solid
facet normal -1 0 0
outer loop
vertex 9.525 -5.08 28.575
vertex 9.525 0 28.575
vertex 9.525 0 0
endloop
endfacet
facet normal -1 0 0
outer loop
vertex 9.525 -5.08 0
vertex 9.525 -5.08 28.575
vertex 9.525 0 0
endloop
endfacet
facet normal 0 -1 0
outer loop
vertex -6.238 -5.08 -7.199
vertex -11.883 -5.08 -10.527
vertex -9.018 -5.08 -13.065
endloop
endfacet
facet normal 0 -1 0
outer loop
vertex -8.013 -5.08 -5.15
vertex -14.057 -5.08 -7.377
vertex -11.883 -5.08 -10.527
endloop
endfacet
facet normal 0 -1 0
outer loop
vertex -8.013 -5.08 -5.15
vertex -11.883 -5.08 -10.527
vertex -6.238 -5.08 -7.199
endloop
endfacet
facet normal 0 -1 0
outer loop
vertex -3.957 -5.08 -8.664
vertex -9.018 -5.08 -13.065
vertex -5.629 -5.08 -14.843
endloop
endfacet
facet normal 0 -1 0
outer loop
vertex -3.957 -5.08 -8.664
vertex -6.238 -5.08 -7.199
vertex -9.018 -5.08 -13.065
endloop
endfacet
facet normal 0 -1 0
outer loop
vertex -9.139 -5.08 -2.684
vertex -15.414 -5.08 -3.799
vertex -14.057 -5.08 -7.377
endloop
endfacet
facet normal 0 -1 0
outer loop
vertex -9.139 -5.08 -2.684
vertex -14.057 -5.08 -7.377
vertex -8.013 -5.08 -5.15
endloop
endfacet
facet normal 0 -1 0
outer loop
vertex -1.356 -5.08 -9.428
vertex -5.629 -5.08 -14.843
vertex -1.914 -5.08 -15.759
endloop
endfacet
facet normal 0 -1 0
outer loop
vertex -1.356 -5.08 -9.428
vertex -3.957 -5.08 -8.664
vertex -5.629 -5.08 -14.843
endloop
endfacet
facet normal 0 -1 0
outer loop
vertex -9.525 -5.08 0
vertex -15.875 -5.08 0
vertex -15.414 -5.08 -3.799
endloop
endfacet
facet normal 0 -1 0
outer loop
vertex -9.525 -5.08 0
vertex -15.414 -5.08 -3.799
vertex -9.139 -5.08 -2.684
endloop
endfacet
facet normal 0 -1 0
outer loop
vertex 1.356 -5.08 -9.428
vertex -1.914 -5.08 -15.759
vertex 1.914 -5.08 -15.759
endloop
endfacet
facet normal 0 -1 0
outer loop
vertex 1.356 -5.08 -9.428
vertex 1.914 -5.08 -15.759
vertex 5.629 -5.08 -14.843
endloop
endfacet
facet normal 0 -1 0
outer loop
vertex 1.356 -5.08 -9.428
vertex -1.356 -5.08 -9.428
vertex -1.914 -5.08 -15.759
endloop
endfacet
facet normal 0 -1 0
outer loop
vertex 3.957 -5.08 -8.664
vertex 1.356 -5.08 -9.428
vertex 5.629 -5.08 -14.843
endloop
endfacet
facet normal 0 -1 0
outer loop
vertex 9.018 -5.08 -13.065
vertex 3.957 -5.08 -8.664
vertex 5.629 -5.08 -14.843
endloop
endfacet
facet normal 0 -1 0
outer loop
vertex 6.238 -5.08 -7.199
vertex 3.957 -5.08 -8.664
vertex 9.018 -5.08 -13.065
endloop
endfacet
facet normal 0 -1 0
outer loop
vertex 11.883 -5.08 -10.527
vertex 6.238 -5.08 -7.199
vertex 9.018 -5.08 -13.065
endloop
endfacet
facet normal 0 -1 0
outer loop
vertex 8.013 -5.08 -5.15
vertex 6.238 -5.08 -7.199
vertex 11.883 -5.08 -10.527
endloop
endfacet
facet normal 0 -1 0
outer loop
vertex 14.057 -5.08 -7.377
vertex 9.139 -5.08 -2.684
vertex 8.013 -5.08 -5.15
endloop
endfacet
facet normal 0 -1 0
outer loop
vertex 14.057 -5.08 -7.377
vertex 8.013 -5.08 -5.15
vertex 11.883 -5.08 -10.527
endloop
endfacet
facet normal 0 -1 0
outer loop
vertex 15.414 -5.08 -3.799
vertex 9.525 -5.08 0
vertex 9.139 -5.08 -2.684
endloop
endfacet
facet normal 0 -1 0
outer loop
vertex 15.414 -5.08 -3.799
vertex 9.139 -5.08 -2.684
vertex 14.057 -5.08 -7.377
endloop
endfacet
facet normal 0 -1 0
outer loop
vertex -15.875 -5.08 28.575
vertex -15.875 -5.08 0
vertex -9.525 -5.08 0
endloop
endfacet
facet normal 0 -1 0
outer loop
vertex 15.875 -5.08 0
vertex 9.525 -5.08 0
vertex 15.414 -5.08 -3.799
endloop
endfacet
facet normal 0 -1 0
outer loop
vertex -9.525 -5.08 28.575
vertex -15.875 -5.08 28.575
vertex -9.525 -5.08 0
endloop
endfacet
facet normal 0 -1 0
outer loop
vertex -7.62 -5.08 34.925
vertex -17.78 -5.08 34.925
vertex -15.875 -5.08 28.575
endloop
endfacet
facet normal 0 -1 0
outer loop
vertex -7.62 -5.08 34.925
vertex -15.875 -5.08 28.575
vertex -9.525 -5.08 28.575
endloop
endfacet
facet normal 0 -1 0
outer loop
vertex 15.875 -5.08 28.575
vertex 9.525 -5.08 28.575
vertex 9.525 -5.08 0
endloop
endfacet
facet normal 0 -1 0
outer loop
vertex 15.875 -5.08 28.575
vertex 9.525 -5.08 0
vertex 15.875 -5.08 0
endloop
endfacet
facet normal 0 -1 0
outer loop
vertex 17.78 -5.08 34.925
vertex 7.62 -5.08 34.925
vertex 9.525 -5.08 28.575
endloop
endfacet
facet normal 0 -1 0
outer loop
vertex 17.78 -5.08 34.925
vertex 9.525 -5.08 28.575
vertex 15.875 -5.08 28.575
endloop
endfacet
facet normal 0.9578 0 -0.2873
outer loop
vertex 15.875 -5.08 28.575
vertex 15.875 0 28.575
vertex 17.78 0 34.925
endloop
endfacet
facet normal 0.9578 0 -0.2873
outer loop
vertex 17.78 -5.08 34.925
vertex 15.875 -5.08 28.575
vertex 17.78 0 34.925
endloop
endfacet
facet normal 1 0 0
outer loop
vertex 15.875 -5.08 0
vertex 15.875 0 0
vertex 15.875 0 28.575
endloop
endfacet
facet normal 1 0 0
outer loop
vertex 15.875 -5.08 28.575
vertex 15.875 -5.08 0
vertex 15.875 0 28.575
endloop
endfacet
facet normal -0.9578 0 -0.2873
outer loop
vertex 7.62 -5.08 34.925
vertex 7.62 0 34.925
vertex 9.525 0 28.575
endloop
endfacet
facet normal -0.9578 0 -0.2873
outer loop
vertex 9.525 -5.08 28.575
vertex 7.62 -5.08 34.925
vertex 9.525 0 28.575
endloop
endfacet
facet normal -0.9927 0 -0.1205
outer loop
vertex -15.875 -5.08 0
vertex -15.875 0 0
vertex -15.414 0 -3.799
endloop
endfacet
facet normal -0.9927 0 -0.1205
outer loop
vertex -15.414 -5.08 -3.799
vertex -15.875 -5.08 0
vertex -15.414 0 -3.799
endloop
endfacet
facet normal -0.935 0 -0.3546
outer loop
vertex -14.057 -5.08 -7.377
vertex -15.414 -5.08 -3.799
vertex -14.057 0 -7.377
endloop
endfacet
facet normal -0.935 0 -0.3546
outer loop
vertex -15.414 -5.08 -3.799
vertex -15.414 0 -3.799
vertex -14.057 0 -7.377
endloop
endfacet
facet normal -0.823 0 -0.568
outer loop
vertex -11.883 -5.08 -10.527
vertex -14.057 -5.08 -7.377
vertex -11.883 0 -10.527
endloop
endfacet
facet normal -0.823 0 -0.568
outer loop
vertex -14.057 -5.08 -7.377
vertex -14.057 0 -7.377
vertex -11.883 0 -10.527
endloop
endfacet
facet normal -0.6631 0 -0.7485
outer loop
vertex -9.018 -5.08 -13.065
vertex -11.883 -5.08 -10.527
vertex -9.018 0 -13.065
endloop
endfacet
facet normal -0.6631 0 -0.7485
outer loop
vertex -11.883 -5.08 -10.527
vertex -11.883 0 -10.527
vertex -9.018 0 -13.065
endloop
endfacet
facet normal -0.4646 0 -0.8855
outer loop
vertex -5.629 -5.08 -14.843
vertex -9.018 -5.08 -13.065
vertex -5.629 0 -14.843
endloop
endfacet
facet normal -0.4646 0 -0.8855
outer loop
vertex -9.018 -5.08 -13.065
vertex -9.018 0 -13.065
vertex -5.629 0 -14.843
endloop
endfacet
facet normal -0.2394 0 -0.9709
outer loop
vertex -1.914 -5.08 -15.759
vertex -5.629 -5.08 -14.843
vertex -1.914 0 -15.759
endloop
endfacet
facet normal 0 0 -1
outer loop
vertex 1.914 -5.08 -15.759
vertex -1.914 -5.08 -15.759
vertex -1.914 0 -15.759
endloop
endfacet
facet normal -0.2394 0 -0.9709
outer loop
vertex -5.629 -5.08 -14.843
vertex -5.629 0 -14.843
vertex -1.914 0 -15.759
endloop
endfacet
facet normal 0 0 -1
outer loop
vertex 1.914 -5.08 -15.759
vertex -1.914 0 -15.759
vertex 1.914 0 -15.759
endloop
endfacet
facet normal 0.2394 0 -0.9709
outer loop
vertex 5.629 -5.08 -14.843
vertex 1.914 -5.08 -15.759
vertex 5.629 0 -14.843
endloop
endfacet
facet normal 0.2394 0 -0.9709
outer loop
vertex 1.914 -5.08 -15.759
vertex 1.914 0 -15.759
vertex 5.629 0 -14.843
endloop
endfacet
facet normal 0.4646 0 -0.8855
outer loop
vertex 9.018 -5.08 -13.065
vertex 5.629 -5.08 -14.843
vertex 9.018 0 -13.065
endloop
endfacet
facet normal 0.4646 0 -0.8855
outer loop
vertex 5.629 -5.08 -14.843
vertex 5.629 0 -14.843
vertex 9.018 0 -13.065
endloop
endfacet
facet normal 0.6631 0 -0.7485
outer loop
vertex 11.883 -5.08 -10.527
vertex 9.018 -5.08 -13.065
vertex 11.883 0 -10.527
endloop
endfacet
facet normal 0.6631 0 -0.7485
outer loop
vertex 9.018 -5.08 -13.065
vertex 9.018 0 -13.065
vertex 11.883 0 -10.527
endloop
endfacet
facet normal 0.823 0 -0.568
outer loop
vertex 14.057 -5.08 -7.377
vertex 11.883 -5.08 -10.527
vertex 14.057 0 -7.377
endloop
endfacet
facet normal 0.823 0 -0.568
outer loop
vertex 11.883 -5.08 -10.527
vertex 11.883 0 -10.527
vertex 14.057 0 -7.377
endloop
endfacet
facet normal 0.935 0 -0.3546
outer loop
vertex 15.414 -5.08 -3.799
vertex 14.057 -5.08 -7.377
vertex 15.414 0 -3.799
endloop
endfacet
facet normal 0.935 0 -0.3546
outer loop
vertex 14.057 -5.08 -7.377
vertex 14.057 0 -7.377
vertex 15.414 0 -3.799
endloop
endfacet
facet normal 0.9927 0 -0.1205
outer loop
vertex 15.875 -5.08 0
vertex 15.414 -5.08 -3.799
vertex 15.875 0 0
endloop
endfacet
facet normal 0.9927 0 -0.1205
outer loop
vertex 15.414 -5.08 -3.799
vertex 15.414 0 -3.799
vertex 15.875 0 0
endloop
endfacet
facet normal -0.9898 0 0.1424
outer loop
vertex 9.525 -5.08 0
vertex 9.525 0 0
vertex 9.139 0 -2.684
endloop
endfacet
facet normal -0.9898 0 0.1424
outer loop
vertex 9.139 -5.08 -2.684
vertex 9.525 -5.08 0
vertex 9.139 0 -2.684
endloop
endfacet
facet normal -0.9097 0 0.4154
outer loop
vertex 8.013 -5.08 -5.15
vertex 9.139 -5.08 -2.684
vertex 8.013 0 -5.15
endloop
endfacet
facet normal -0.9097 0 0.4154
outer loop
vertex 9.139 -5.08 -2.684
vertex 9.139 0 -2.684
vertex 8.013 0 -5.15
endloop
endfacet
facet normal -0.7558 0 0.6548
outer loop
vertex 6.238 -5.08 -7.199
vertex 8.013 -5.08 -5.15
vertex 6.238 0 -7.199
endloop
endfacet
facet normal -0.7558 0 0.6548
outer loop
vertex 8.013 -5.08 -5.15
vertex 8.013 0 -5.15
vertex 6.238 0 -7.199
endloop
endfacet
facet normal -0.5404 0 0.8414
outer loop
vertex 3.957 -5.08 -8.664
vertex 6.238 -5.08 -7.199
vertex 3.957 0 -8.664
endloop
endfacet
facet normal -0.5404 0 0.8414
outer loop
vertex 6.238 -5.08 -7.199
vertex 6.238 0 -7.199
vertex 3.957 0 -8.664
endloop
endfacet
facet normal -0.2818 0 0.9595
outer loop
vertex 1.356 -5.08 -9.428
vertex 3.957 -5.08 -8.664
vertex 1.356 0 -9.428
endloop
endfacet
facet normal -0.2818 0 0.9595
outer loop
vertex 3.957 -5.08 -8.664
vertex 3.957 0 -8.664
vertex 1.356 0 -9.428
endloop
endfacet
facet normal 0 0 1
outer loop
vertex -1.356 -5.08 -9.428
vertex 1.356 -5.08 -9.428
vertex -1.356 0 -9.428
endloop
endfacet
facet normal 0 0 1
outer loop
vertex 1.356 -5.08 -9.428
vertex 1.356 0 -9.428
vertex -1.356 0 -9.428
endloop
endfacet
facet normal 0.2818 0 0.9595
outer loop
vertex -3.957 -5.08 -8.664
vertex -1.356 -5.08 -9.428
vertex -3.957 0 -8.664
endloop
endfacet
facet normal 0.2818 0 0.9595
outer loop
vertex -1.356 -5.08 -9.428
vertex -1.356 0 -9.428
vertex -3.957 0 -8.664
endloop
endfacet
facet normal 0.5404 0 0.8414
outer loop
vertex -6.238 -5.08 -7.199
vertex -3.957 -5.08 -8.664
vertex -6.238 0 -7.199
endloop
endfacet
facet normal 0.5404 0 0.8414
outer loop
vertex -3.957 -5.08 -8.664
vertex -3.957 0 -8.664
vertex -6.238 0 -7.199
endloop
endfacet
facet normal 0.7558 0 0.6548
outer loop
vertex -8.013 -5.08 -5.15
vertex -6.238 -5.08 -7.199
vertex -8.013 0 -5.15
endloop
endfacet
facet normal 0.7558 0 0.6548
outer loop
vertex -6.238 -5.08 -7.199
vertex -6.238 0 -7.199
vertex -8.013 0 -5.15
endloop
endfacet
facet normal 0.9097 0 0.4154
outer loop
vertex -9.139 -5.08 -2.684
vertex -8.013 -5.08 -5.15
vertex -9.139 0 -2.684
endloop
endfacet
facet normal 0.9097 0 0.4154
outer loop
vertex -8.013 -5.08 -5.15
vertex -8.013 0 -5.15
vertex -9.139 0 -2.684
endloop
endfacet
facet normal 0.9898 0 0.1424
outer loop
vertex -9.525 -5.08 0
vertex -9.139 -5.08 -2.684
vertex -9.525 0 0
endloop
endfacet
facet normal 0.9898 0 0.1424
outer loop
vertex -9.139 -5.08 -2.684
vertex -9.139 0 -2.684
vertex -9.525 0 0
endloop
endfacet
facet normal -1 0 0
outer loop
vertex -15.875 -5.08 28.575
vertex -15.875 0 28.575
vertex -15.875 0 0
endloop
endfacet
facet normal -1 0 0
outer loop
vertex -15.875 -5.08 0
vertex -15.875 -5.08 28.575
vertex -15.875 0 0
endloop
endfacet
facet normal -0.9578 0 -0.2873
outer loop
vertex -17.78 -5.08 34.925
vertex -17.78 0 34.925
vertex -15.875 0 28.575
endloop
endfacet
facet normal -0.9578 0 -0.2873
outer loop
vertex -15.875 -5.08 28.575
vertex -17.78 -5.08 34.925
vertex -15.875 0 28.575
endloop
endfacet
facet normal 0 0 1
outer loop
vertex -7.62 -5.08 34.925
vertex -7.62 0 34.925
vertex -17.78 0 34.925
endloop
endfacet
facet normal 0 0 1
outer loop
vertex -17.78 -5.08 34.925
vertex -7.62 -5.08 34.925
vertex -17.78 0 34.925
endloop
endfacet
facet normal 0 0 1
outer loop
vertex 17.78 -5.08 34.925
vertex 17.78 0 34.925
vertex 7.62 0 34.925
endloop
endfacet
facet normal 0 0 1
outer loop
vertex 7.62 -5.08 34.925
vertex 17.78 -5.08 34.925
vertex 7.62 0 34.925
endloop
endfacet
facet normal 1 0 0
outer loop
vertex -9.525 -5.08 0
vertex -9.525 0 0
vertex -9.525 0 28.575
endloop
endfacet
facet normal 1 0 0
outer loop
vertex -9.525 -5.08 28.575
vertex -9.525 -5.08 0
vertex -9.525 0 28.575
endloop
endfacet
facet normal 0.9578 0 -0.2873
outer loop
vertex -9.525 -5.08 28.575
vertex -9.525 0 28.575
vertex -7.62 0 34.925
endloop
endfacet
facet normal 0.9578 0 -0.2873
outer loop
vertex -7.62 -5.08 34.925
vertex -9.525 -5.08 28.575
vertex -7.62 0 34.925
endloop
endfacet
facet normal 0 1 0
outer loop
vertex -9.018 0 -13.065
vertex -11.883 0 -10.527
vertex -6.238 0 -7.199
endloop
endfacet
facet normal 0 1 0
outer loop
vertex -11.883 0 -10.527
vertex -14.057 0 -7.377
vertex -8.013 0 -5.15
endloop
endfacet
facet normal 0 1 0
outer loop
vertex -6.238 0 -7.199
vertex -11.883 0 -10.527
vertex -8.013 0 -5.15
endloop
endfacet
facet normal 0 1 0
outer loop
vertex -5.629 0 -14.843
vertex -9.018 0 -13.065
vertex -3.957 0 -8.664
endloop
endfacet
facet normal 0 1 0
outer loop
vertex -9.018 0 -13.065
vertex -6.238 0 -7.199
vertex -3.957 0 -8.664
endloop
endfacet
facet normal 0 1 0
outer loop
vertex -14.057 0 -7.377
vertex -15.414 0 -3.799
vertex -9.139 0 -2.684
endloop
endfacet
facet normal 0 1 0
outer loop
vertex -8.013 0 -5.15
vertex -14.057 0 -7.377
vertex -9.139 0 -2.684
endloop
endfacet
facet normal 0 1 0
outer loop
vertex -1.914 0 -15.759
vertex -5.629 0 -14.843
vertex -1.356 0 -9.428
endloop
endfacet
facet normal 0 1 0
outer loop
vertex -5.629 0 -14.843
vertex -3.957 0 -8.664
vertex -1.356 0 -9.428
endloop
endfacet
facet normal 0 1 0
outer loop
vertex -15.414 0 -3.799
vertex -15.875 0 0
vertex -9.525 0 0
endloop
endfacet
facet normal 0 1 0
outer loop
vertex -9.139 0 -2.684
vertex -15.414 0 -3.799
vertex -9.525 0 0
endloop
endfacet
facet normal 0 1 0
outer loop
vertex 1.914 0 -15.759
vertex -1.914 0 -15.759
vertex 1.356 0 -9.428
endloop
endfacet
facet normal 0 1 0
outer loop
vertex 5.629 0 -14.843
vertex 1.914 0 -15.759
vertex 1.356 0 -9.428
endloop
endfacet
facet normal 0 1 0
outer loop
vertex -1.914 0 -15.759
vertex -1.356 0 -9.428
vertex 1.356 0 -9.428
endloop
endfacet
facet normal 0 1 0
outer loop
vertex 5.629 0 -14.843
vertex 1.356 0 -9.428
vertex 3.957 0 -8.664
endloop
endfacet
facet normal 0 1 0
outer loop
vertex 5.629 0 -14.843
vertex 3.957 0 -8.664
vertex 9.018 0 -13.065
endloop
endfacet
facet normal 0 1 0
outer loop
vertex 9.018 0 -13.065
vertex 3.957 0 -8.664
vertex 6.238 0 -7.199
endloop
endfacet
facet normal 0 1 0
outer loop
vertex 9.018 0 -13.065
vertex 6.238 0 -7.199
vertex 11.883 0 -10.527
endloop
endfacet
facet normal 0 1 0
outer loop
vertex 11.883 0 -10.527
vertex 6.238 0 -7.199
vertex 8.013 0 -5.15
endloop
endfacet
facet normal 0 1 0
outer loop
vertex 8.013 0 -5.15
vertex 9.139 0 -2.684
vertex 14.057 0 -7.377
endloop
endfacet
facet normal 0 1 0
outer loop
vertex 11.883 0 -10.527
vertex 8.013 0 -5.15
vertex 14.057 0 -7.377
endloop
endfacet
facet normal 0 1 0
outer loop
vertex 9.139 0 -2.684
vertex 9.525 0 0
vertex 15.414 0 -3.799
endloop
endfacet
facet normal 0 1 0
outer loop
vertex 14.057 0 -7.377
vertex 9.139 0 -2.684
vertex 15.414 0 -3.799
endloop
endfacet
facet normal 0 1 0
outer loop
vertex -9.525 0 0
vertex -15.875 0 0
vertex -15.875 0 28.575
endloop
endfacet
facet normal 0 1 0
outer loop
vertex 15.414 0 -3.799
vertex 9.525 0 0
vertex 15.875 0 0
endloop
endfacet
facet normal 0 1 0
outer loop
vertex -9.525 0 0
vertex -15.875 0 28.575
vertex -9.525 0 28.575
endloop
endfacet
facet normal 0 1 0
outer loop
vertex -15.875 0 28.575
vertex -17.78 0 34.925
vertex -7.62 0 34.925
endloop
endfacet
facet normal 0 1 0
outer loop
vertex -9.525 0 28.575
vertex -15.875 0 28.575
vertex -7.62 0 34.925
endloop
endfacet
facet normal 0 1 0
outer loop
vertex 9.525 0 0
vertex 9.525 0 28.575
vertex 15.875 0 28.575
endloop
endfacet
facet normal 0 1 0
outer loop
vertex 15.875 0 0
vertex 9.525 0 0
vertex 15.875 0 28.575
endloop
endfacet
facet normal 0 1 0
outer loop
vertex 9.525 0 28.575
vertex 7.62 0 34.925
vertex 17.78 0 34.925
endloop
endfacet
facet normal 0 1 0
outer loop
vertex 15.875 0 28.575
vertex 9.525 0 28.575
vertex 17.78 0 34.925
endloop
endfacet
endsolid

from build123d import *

# Parameters (mm, degrees)
F1_DEPTH = 5.08


with BuildPart() as f1:
    # F0 (on Front) → F1 (new body)
    with BuildSketch(Plane.XZ):
        with BuildLine():
            Line((-15.875, 28.575), (-15.875, 0))
            ThreePointArc((-15.875, 0), (0, -15.875), (15.875, 0))
            Line((15.875, 0), (15.875, 28.575))
            Line((15.875, 28.575), (17.78, 34.925))
            Line((17.78, 34.925), (15.875, 34.925))
            Line((15.875, 34.925), (9.525, 34.925))
            Line((9.525, 34.925), (7.62, 34.925))
            Line((7.62, 34.925), (9.525, 28.575))
            Line((9.525, 28.575), (9.525, 0))
            ThreePointArc((9.525, 0), (0, -9.525), (-9.525, 0))
            Line((-9.525, 0), (-9.525, 28.575))
            Line((-9.525, 28.575), (-7.62, 34.925))
            Line((-7.62, 34.925), (-9.525, 34.925))
            Line((-9.525, 34.925), (-15.875, 34.925))
            Line((-15.875, 34.925), (-17.78, 34.925))
            Line((-17.78, 34.925), (-15.875, 28.575))
        make_face()
    extrude(amount=F1_DEPTH)


solid = f1.part
